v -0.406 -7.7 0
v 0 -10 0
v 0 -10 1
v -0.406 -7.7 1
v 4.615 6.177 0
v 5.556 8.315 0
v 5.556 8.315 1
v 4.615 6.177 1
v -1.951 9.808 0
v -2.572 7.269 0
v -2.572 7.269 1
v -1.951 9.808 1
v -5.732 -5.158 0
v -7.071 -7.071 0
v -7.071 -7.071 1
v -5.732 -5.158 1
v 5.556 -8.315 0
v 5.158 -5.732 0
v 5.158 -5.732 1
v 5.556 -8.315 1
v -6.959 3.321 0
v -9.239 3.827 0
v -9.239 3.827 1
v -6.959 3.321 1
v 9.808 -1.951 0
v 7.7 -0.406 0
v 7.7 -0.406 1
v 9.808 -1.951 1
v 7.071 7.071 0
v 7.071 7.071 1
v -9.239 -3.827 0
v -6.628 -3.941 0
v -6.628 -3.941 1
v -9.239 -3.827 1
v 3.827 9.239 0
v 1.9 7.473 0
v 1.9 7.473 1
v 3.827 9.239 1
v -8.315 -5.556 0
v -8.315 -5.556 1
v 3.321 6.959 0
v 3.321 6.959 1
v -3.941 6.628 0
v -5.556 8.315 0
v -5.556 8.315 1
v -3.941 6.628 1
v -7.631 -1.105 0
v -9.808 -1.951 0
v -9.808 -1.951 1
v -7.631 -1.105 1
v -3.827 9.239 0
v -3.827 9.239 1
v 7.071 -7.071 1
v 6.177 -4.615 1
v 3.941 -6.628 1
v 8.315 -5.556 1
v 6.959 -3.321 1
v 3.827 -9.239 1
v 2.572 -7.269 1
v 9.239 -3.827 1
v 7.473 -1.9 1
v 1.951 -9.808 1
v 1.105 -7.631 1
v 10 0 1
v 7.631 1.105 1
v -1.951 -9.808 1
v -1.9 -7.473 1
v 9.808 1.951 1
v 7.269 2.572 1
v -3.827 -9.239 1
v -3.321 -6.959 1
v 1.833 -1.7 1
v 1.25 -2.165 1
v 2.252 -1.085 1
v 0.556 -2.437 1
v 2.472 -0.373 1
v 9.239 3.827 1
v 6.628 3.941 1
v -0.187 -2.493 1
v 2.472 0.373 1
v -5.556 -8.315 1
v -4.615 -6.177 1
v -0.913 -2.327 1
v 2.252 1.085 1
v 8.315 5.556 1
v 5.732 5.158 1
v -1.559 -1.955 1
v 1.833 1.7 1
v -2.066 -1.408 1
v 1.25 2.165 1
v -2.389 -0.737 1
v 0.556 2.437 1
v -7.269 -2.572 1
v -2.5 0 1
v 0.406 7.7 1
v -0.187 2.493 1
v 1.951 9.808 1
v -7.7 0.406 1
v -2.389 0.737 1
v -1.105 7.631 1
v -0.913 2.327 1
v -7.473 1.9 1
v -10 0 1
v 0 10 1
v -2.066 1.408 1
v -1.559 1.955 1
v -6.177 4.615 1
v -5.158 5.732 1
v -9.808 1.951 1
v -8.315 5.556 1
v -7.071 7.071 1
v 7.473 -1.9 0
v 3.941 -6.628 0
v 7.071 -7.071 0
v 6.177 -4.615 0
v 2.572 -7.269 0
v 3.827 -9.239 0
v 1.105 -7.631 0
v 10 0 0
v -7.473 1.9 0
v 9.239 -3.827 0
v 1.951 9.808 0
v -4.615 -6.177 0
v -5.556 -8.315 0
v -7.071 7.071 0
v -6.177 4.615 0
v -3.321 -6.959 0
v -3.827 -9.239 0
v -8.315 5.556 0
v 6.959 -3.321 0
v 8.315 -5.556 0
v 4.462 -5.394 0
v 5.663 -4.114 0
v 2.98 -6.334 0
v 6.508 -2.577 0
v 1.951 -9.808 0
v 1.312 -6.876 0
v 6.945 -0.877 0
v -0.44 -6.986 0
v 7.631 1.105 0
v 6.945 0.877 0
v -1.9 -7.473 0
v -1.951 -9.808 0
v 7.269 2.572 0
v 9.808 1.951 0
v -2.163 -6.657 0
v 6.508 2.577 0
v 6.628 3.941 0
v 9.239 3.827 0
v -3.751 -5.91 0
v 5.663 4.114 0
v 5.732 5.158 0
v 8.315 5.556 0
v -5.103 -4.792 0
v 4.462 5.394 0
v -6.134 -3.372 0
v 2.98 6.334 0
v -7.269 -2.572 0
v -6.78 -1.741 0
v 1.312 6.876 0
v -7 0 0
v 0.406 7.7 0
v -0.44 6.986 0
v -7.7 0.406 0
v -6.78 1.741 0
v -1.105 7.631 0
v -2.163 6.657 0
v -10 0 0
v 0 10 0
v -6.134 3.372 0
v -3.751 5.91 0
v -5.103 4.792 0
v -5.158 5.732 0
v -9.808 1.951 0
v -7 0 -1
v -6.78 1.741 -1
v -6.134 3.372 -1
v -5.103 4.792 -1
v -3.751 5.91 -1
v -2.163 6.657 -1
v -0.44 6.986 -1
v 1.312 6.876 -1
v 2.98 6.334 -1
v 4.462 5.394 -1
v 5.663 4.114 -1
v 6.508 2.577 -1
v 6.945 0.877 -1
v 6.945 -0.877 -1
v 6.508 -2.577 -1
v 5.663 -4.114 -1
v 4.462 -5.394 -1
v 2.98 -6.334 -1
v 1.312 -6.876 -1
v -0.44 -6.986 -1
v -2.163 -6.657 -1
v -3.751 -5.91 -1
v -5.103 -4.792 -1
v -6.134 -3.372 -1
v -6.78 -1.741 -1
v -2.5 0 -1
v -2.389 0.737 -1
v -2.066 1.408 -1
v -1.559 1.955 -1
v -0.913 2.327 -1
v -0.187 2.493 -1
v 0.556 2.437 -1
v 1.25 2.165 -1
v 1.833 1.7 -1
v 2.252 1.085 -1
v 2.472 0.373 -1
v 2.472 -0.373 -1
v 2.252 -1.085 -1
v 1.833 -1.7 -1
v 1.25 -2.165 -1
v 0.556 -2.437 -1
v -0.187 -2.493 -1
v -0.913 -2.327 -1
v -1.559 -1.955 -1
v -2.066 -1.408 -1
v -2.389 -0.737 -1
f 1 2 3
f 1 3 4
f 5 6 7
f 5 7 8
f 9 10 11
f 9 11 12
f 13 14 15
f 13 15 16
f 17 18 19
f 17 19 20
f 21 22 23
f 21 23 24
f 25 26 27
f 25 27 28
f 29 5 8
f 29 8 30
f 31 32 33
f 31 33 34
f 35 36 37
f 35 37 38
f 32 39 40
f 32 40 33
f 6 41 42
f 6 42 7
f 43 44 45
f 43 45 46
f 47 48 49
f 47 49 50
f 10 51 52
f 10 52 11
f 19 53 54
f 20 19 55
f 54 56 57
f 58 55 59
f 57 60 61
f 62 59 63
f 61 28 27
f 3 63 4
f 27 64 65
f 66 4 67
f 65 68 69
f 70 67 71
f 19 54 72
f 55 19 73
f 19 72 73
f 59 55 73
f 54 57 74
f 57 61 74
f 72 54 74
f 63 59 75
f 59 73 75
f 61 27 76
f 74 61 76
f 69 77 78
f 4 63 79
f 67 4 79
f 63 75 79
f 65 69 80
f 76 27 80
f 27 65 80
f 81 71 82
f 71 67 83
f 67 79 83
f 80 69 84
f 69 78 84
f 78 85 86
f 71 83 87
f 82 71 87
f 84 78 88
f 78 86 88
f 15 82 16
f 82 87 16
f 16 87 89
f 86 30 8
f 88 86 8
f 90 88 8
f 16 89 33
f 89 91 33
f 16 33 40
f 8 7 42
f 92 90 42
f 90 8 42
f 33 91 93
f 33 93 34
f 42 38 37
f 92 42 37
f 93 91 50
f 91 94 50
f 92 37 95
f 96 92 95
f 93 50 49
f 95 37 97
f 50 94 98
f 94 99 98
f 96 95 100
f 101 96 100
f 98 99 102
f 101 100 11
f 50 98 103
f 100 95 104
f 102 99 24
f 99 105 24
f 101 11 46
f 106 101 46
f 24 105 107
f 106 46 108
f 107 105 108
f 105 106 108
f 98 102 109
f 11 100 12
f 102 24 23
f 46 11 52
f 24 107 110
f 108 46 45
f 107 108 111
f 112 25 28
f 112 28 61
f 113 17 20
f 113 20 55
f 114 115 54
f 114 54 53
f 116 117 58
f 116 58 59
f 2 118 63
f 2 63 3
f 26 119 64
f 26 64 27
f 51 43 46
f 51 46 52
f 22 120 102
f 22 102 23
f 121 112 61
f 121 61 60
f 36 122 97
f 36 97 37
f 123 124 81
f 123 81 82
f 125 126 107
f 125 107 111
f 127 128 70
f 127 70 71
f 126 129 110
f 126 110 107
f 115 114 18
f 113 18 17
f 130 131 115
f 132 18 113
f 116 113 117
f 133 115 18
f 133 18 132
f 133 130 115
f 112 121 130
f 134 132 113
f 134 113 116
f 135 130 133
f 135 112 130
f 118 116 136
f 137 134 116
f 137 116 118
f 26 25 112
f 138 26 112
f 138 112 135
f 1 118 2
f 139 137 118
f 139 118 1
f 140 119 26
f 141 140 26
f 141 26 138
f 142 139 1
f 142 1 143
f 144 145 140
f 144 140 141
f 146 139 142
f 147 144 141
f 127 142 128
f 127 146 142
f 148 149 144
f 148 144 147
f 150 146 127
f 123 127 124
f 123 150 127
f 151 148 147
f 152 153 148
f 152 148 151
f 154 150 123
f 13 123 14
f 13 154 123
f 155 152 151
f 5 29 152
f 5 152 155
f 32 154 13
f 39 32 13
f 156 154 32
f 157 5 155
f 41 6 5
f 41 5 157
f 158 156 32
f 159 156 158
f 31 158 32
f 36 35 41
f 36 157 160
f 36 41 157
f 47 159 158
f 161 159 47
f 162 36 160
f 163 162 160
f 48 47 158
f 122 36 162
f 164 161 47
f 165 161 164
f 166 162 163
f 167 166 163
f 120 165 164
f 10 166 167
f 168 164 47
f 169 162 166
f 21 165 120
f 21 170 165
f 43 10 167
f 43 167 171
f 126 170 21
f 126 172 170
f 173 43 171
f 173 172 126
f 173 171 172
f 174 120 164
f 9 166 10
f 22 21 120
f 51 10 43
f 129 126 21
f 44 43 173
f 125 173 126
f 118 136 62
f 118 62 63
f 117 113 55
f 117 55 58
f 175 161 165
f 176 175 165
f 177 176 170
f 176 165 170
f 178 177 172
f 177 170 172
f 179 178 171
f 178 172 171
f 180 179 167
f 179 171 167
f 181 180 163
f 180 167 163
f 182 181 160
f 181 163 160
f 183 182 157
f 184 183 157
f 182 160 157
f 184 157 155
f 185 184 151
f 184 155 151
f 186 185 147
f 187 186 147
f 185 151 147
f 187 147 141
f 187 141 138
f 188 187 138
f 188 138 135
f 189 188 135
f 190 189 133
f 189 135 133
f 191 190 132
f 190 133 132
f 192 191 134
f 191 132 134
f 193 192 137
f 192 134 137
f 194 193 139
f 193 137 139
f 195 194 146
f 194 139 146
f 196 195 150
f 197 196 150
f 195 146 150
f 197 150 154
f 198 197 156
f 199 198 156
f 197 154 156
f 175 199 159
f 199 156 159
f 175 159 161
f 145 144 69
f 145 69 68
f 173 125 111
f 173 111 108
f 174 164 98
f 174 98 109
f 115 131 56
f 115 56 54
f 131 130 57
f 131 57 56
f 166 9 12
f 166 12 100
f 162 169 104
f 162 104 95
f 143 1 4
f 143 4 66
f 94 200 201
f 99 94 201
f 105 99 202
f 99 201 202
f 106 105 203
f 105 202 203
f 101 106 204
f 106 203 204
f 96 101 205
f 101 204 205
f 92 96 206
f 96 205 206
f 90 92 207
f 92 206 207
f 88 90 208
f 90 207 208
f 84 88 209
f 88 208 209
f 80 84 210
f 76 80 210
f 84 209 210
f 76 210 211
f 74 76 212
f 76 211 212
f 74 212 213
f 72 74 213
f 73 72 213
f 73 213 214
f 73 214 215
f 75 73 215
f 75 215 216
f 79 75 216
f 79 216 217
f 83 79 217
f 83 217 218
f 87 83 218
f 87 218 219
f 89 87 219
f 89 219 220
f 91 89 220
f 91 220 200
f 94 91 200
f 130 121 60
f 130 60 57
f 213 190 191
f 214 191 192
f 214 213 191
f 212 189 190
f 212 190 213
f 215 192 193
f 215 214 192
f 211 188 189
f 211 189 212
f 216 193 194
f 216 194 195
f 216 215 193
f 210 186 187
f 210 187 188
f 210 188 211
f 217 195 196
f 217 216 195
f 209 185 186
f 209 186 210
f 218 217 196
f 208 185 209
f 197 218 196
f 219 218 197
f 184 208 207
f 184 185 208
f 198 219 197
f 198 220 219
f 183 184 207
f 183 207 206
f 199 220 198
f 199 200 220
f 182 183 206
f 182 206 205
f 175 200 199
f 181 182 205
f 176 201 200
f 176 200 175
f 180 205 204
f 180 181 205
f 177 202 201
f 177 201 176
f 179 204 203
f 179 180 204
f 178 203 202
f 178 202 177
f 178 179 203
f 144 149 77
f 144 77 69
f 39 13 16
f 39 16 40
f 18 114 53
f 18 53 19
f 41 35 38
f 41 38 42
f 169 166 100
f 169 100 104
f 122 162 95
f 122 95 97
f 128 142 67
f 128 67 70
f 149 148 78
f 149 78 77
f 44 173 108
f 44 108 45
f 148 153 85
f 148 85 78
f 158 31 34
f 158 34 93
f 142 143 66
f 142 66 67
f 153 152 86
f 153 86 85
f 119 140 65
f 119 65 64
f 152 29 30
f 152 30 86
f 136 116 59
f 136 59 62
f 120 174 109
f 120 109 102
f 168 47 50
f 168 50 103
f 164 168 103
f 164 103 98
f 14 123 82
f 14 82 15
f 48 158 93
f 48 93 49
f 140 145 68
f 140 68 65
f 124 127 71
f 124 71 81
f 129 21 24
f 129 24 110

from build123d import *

# Parameters (mm, degrees)
Y_KSEKLIK_EKSTR_ZYON1_DEPTH = 1
IZIM3_R                     = 7
Y_KSEKLIK_EKSTR_ZYON2_DEPTH = 1
IZIM4_R                     = 2.5
KES_EKSTR_ZYON1_DEPTH       = 4


with BuildPart() as part:
    # Çizim1 → Yükseklik-Ekstrüzyon1 (new body)
    with BuildSketch(Plane.XY):
        Polygon((0, 10), (0.405515134, 7.700209394), (1.95090322, 9.807852804), (1.899959604, 7.473139952), (3.826834324, 9.238795325), (3.321389693, 6.958881932), (5.55570233, 8.314696123), (4.615180638, 6.177197982), (7.071067812, 7.071067812), (5.73161278, 5.158127778), (8.314696123, 5.55570233), (6.627782257, 3.940833616), (9.238795325, 3.826834324), (7.269249778, 2.572095429), (9.807852804, 1.95090322), (7.631364108, 1.104513056), (10, 0), (7.700209394, -0.405515134), (9.807852804, -1.95090322), (7.473139952, -1.899959604), (9.238795325, -3.826834324), (6.958881932, -3.321389693), (8.314696123, -5.55570233), (6.177197982, -4.615180638), (7.071067812, -7.071067812), (5.158127778, -5.73161278), (5.55570233, -8.314696123), (3.940833616, -6.627782257), (3.826834324, -9.238795325), (2.572095429, -7.269249778), (1.95090322, -9.807852804), (1.104513056, -7.631364108), (0, -10), (-0.405515134, -7.700209394), (-1.95090322, -9.807852804), (-1.899959604, -7.473139952), (-3.826834324, -9.238795325), (-3.321389693, -6.958881932), (-5.55570233, -8.314696123), (-4.615180638, -6.177197982), (-7.071067812, -7.071067812), (-5.73161278, -5.158127778), (-8.314696123, -5.55570233), (-6.627782257, -3.940833616), (-9.238795325, -3.826834324), (-7.269249778, -2.572095429), (-9.807852804, -1.95090322), (-7.631364108, -1.104513056), (-10, 0), (-7.700209394, 0.405515134), (-9.807852804, 1.95090322), (-7.473139952, 1.899959604), (-9.238795325, 3.826834324), (-6.958881932, 3.321389693), (-8.314696123, 5.55570233), (-6.177197982, 4.615180638), (-7.071067812, 7.071067812), (-5.158127778, 5.73161278), (-5.55570233, 8.314696123), (-3.940833616, 6.627782257), (-3.826834324, 9.238795325), (-2.572095429, 7.269249778), (-1.95090322, 9.807852804), (-1.104513056, 7.631364108), align=None)
    extrude(amount=Y_KSEKLIK_EKSTR_ZYON1_DEPTH)

    # Çizim3 → Yükseklik-Ekstrüzyon2 (add)
    with BuildSketch(Plane(origin=(0, 0, 0), x_dir=(-1, 0, 0), z_dir=(0, 0, -1))):
        Circle(IZIM3_R)
    extrude(amount=Y_KSEKLIK_EKSTR_ZYON2_DEPTH)

    # Çizim4 → Kes-Ekstrüzyon1 (cut)
    with BuildSketch(Plane(origin=(0, 0, -1), x_dir=(-1, 0, 0), z_dir=(0, 0, -1))):
        Circle(IZIM4_R)
    extrude(amount=-KES_EKSTR_ZYON1_DEPTH, mode=Mode.SUBTRACT)


solid = part.part
